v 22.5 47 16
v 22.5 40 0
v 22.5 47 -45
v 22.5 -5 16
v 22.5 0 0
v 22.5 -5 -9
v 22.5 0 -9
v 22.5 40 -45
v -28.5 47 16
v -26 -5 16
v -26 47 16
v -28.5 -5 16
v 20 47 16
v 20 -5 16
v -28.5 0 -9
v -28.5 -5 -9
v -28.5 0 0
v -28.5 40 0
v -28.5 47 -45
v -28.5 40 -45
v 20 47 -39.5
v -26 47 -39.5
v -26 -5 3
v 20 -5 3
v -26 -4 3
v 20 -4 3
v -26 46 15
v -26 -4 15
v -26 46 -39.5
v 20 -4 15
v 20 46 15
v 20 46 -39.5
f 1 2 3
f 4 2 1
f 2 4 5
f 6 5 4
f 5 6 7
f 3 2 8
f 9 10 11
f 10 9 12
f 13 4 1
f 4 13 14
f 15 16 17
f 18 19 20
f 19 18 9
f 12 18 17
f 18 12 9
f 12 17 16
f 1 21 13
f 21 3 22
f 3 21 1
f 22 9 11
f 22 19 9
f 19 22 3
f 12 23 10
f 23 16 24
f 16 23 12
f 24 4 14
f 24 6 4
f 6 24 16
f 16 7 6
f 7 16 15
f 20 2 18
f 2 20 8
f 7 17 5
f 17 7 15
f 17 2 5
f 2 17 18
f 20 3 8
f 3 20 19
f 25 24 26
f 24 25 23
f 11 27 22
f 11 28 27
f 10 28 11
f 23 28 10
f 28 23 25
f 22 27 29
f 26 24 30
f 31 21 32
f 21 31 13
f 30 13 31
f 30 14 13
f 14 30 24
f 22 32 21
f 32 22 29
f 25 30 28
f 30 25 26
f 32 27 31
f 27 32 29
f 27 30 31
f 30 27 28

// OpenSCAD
// Camera base
//cube([45, 50, 48]);

// Monitor
module monitor() {
    width=300;
    height=100;
    monitor_thickness=40;
    
    translate([-50, 0,0])
       rotate([270, 0, 0]) {

            union() {
                cube([width, height+45, monitor_thickness]);
                translate([0, 45, 38])
                    cube([width, height, 70]);
            }
        };
}

// Camera base
module camera() {
    external_width=43-3;
    internal_depth=50;
    leg_height=57.5;
    plastic_thickness=3;
    max_widtdh=200;
    front_lip_h=12;
    
    over=10;
    
    translate([-over/2, -plastic_thickness, plastic_thickness])
    translate([external_width, internal_depth, 0])
    rotate([270, 0,180])
    difference() {
        // external box
    color("blue")
        translate([0,0, -plastic_thickness])
        cube([external_width+2*plastic_thickness,  leg_height, internal_depth + 2*plastic_thickness]);
        
    // internal box
    
    color("red")
    translate([-over/2, plastic_thickness, 0])
        cube([external_width+2*over, leg_height + plastic_thickness, internal_depth]);
    
    
    // front lip box
    difference() {
    color("cyan")
        translate([-1, plastic_thickness, internal_depth/2])
            cube([max_widtdh+2*over, leg_height + plastic_thickness, internal_depth]);
        color("green")
            translate([-over, plastic_thickness-1, internal_depth/2])
            cube([max_widtdh+2*over, front_lip_h+1, max_widtdh]);
    }
    }
}

module camera_adaptor() {
}


// mount



//color("purple")

difference() {
    
translate([-28.5,-5,-84])
difference() 
    {
    width=54-3;
        depth=50;
    cube([width,depth+2,100]);
    translate([-1,-10, -25])
    cube([width+2,depth+2,100]);
}

color("gray", 1.0)
    monitor();

color("blue")
translate([-15,-1,15])
camera();
}
